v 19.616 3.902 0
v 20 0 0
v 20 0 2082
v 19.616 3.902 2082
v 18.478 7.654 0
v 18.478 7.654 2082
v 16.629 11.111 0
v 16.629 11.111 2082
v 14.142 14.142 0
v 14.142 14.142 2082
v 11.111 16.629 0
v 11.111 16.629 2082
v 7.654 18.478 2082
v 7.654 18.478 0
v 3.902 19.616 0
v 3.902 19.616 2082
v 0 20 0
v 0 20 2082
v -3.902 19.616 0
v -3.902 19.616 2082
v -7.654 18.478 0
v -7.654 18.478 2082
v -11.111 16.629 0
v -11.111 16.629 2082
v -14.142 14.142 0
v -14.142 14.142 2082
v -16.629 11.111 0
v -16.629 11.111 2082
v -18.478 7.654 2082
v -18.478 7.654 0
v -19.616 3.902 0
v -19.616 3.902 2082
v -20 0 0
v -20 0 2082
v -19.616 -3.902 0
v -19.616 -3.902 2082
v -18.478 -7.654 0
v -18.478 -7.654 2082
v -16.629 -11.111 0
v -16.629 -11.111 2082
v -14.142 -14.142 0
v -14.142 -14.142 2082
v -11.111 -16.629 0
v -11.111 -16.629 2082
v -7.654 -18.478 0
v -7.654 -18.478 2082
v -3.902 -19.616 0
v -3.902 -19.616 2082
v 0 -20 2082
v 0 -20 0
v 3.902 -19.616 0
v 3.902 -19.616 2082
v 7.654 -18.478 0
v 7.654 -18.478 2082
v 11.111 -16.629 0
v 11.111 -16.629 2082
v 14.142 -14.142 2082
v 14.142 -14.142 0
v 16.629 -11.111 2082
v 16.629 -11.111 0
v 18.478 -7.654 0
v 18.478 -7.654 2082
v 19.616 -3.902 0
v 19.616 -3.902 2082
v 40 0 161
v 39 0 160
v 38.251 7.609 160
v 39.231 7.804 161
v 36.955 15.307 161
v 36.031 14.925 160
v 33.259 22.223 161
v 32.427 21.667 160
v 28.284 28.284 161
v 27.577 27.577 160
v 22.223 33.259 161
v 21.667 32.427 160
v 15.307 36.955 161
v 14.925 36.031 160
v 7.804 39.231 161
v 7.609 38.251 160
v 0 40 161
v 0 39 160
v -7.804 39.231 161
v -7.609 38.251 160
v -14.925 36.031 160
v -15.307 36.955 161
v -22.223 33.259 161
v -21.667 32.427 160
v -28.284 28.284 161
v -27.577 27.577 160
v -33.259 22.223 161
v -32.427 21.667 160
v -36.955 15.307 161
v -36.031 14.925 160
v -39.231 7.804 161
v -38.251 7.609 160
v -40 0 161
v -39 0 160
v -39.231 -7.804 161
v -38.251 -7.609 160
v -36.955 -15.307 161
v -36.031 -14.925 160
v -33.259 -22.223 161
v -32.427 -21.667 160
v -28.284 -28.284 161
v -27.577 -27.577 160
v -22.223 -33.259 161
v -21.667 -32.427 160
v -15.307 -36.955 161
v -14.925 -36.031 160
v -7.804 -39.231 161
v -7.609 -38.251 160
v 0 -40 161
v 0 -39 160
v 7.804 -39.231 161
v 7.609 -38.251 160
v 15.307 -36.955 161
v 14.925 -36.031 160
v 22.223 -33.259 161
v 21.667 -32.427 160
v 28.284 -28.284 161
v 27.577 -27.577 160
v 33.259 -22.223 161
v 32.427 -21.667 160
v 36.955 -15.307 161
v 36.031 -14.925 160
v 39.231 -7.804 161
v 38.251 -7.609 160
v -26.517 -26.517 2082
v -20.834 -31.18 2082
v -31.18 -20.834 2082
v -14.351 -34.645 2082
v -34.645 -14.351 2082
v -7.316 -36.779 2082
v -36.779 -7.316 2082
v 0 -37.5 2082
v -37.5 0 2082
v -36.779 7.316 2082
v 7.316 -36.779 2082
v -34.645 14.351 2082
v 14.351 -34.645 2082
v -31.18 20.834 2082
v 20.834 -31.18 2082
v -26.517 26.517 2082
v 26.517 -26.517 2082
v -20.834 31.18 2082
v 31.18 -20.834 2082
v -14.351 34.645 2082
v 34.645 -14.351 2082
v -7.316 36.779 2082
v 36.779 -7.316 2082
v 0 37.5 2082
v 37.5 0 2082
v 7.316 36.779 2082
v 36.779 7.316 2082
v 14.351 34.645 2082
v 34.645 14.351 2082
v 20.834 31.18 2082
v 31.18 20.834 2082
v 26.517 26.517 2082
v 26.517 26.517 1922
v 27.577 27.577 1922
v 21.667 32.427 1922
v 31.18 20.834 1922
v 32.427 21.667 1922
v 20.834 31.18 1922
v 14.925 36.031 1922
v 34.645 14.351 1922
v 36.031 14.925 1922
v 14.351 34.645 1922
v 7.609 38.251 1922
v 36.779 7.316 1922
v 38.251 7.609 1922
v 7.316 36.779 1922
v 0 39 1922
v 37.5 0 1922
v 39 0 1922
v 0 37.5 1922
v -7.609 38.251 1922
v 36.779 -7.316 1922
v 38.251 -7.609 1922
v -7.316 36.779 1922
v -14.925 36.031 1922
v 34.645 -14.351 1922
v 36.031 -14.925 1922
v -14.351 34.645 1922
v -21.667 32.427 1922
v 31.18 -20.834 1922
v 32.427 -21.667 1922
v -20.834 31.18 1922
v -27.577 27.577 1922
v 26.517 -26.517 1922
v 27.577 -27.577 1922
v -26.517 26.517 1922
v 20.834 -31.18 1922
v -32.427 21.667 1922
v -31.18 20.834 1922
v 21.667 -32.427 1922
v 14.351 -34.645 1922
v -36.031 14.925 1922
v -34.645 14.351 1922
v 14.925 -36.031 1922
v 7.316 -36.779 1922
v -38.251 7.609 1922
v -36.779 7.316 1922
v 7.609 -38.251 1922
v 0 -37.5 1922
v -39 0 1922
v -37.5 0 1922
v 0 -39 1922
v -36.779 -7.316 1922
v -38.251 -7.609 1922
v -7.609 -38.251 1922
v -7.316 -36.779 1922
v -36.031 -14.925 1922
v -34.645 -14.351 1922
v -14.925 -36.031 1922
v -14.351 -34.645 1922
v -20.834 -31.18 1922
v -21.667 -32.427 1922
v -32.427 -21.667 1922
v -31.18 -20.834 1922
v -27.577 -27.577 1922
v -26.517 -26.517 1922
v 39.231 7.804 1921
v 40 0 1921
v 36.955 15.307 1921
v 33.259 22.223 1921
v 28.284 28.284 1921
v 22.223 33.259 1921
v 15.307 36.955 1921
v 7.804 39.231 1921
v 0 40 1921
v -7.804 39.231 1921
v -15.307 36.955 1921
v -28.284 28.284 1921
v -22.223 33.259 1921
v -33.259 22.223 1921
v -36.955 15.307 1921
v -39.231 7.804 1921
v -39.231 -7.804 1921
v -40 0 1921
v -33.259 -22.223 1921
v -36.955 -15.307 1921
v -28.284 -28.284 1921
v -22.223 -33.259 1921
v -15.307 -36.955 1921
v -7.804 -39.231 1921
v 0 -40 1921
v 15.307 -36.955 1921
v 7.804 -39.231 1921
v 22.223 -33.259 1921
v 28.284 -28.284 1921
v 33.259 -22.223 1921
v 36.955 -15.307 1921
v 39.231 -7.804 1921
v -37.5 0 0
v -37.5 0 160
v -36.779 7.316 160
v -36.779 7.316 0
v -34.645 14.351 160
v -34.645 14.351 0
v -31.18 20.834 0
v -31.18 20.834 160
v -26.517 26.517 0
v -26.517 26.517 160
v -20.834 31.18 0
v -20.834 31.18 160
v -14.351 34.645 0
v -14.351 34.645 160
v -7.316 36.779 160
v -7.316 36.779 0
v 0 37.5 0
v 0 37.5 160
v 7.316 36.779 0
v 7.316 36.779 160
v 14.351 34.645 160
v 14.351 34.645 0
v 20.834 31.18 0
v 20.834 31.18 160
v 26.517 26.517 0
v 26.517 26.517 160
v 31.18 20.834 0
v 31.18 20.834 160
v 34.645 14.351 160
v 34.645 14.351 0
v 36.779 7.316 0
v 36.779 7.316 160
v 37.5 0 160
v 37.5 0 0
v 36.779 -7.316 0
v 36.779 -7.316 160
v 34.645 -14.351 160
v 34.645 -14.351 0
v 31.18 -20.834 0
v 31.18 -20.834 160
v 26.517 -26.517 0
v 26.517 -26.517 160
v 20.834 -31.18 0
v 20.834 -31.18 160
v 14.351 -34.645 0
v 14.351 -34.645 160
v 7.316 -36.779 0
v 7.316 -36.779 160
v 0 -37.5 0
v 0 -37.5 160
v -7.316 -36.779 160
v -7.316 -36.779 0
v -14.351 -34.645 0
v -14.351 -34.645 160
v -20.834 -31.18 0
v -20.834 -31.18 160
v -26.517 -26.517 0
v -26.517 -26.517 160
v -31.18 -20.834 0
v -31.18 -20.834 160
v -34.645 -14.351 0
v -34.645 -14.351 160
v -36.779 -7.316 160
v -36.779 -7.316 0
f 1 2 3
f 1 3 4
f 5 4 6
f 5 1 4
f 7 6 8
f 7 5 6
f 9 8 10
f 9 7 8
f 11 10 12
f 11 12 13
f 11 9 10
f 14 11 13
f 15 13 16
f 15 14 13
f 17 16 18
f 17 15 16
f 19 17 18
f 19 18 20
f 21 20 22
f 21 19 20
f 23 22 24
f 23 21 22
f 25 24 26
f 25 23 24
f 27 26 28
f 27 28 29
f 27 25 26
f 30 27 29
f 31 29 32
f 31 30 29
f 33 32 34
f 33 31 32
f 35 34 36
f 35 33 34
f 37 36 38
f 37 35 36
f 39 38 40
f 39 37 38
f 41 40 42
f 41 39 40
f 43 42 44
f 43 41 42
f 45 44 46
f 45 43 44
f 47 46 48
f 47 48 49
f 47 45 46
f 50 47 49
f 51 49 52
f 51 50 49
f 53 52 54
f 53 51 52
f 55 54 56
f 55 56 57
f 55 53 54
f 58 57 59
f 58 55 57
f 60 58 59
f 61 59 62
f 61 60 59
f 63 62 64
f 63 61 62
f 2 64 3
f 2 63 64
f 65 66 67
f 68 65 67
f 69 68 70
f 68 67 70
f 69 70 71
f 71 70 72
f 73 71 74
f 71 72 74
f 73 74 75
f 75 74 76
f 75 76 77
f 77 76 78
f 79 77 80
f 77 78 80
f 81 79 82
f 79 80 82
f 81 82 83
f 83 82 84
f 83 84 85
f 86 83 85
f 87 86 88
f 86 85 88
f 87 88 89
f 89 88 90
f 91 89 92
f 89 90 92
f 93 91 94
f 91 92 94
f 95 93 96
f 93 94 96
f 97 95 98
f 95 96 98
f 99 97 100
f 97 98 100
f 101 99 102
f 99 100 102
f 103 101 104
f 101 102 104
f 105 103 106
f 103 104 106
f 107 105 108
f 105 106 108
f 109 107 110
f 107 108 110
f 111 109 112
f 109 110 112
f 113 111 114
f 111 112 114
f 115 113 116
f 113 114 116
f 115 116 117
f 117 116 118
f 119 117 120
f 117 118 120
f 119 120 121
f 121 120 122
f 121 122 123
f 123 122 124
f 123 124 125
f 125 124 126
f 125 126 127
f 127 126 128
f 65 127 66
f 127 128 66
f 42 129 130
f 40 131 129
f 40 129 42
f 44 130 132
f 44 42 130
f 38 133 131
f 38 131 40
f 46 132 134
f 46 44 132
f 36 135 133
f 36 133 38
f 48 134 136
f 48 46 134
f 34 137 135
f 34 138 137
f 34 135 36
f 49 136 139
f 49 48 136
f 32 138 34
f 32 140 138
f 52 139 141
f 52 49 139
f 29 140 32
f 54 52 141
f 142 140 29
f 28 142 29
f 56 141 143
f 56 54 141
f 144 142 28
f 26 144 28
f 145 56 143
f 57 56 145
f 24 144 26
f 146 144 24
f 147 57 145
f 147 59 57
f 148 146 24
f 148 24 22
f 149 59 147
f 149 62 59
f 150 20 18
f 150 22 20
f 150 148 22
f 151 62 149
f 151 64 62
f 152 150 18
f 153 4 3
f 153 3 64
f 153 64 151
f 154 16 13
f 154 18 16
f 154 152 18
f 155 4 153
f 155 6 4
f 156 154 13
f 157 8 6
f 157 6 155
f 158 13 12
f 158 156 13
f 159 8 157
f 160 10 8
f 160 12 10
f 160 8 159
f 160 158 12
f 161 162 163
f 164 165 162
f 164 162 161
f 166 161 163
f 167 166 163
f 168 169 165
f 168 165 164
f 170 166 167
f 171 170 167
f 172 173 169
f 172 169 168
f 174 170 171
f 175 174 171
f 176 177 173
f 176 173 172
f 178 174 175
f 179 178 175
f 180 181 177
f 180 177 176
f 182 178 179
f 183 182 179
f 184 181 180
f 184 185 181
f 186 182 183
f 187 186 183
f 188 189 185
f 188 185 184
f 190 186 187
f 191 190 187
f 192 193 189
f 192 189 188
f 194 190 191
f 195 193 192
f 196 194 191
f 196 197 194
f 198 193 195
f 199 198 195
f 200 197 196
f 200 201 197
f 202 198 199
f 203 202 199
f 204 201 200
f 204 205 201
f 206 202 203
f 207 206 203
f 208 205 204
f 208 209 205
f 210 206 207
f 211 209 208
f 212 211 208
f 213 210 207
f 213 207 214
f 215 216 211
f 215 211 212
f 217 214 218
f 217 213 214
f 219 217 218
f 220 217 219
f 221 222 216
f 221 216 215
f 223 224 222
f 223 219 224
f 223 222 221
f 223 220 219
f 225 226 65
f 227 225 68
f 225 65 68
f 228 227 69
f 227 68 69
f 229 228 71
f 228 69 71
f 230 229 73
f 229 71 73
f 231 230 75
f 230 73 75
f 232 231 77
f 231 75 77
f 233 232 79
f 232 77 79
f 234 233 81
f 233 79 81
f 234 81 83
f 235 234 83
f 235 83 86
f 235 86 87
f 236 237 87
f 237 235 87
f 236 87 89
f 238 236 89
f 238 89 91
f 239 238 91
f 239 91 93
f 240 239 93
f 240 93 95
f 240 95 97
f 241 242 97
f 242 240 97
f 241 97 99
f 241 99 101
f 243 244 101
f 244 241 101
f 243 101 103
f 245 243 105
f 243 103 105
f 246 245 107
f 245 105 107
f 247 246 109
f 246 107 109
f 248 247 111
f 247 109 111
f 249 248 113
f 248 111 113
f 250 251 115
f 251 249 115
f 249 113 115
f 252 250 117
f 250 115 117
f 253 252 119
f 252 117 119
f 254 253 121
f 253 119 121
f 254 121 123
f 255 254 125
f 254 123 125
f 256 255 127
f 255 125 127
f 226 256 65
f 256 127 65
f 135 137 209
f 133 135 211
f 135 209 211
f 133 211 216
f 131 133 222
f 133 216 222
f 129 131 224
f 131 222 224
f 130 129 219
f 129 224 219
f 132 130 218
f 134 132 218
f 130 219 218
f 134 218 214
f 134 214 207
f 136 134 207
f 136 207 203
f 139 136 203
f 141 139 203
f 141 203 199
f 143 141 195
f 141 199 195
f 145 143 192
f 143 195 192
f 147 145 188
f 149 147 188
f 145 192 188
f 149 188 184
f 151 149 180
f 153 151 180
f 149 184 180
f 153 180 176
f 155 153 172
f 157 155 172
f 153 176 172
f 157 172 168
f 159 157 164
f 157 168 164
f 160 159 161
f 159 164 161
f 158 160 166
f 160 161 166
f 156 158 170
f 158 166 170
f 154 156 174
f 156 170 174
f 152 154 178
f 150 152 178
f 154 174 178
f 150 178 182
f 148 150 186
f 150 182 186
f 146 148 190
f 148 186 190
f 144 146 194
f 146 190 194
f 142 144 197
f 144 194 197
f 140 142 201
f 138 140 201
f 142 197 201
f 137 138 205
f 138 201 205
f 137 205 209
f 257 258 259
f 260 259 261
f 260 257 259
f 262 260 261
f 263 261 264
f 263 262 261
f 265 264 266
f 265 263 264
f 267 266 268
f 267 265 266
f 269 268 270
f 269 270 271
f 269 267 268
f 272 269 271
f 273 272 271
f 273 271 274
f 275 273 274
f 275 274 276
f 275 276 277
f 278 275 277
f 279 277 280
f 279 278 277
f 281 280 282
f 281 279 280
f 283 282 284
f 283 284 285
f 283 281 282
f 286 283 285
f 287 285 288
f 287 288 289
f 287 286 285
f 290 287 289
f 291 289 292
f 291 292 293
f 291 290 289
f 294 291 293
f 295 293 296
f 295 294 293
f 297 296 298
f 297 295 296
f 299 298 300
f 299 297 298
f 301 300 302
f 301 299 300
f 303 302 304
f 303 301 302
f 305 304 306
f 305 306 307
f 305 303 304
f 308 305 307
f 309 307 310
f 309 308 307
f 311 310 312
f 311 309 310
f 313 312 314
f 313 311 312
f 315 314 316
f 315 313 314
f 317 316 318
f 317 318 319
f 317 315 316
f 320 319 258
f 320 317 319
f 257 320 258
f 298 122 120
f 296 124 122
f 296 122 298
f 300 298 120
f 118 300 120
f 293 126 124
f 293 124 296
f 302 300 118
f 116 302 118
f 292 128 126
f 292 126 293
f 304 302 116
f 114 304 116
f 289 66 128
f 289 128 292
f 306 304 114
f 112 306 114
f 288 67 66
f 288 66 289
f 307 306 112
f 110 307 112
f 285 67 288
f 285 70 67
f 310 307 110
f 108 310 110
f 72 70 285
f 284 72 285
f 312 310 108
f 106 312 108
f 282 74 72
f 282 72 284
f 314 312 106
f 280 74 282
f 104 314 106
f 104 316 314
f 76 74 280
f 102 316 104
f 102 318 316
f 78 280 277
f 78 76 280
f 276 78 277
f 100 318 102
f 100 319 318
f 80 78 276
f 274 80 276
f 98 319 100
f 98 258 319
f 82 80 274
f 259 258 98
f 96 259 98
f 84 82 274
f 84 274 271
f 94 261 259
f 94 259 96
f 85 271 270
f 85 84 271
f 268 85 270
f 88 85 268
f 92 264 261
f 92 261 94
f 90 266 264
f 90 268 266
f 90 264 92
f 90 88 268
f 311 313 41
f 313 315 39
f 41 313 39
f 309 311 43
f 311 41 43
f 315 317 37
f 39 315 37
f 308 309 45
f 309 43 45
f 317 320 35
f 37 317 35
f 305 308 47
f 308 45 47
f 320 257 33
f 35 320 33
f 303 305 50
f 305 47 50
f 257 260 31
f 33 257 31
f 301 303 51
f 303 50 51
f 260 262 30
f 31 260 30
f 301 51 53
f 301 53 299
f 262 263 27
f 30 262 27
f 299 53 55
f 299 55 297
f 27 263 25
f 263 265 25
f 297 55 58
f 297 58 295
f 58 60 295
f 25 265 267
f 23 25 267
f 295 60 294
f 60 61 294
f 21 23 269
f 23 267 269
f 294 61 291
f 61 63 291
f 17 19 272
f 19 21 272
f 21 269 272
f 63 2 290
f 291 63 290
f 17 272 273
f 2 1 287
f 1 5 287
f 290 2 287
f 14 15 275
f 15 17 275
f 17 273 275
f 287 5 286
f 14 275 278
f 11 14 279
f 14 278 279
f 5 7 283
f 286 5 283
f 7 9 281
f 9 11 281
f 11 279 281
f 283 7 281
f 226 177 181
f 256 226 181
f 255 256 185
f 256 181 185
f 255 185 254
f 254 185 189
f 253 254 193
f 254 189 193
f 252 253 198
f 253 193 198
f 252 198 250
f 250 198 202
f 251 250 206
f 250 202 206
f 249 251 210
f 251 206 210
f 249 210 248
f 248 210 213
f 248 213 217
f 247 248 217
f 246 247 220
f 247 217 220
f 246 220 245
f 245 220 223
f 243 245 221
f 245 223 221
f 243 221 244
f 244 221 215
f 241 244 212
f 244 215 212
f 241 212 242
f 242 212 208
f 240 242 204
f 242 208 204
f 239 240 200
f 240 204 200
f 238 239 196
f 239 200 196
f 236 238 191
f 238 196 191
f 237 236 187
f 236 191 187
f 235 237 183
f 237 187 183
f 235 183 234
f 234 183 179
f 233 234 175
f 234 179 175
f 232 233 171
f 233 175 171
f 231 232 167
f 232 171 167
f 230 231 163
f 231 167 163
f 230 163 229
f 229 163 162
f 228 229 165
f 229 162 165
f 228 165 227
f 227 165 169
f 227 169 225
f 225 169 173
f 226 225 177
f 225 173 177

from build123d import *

# Parameters (mm, degrees)
SKETCH_1_R          = 40
SKETCH_1_R_2        = 20
EXTRUDE_1_DEPTH     = 2082
SKETCH_2_R          = 40
SKETCH_2_R_2        = 37.5
CUT_EXTRUDE_1_DEPTH = 160
CUT_EXTRUDE_START   = -160
SKETCH_3_R          = 40
SKETCH_3_R_2        = 37.5
CUT_EXTRUDE_2_DEPTH = 160
CHAMFER_1_SIZE      = 1


with BuildPart() as part:
    # 草图1 → 凸台-拉伸1 (new body)
    with BuildSketch(Plane.XY):
        Circle(SKETCH_1_R)
        Circle(SKETCH_1_R_2, mode=Mode.SUBTRACT)
    extrude(amount=EXTRUDE_1_DEPTH)

    # 草图2 → 切除-拉伸1 (cut)
    with BuildSketch(Plane(origin=(0, 0, 0), x_dir=(-1, 0, 0), z_dir=(0, 0, -1))):
        Circle(SKETCH_2_R)
        Circle(SKETCH_2_R_2, mode=Mode.SUBTRACT)
    extrude(amount=-CUT_EXTRUDE_1_DEPTH, mode=Mode.SUBTRACT)

    # 草图3 → 切除-拉伸2 (cut)
    with BuildSketch(Plane.XY.offset(2082).offset(CUT_EXTRUDE_START)):
        with Locations(Location((0, 0, 0), (0, 0, 180))):
            Circle(SKETCH_3_R)
        with Locations(Location((0, 0, 0), (0, 0, 180))):
            Circle(SKETCH_3_R_2, mode=Mode.SUBTRACT)
    extrude(amount=CUT_EXTRUDE_2_DEPTH, mode=Mode.SUBTRACT)

    # 倒角1
    chamfer_1_edges = [part.edges().sort_by_distance(p)[0] for p in [
        (-40, 0, 160),
        (-40, 0, 1922),
    ]]
    chamfer(chamfer_1_edges, length=CHAMFER_1_SIZE)


solid = part.part
